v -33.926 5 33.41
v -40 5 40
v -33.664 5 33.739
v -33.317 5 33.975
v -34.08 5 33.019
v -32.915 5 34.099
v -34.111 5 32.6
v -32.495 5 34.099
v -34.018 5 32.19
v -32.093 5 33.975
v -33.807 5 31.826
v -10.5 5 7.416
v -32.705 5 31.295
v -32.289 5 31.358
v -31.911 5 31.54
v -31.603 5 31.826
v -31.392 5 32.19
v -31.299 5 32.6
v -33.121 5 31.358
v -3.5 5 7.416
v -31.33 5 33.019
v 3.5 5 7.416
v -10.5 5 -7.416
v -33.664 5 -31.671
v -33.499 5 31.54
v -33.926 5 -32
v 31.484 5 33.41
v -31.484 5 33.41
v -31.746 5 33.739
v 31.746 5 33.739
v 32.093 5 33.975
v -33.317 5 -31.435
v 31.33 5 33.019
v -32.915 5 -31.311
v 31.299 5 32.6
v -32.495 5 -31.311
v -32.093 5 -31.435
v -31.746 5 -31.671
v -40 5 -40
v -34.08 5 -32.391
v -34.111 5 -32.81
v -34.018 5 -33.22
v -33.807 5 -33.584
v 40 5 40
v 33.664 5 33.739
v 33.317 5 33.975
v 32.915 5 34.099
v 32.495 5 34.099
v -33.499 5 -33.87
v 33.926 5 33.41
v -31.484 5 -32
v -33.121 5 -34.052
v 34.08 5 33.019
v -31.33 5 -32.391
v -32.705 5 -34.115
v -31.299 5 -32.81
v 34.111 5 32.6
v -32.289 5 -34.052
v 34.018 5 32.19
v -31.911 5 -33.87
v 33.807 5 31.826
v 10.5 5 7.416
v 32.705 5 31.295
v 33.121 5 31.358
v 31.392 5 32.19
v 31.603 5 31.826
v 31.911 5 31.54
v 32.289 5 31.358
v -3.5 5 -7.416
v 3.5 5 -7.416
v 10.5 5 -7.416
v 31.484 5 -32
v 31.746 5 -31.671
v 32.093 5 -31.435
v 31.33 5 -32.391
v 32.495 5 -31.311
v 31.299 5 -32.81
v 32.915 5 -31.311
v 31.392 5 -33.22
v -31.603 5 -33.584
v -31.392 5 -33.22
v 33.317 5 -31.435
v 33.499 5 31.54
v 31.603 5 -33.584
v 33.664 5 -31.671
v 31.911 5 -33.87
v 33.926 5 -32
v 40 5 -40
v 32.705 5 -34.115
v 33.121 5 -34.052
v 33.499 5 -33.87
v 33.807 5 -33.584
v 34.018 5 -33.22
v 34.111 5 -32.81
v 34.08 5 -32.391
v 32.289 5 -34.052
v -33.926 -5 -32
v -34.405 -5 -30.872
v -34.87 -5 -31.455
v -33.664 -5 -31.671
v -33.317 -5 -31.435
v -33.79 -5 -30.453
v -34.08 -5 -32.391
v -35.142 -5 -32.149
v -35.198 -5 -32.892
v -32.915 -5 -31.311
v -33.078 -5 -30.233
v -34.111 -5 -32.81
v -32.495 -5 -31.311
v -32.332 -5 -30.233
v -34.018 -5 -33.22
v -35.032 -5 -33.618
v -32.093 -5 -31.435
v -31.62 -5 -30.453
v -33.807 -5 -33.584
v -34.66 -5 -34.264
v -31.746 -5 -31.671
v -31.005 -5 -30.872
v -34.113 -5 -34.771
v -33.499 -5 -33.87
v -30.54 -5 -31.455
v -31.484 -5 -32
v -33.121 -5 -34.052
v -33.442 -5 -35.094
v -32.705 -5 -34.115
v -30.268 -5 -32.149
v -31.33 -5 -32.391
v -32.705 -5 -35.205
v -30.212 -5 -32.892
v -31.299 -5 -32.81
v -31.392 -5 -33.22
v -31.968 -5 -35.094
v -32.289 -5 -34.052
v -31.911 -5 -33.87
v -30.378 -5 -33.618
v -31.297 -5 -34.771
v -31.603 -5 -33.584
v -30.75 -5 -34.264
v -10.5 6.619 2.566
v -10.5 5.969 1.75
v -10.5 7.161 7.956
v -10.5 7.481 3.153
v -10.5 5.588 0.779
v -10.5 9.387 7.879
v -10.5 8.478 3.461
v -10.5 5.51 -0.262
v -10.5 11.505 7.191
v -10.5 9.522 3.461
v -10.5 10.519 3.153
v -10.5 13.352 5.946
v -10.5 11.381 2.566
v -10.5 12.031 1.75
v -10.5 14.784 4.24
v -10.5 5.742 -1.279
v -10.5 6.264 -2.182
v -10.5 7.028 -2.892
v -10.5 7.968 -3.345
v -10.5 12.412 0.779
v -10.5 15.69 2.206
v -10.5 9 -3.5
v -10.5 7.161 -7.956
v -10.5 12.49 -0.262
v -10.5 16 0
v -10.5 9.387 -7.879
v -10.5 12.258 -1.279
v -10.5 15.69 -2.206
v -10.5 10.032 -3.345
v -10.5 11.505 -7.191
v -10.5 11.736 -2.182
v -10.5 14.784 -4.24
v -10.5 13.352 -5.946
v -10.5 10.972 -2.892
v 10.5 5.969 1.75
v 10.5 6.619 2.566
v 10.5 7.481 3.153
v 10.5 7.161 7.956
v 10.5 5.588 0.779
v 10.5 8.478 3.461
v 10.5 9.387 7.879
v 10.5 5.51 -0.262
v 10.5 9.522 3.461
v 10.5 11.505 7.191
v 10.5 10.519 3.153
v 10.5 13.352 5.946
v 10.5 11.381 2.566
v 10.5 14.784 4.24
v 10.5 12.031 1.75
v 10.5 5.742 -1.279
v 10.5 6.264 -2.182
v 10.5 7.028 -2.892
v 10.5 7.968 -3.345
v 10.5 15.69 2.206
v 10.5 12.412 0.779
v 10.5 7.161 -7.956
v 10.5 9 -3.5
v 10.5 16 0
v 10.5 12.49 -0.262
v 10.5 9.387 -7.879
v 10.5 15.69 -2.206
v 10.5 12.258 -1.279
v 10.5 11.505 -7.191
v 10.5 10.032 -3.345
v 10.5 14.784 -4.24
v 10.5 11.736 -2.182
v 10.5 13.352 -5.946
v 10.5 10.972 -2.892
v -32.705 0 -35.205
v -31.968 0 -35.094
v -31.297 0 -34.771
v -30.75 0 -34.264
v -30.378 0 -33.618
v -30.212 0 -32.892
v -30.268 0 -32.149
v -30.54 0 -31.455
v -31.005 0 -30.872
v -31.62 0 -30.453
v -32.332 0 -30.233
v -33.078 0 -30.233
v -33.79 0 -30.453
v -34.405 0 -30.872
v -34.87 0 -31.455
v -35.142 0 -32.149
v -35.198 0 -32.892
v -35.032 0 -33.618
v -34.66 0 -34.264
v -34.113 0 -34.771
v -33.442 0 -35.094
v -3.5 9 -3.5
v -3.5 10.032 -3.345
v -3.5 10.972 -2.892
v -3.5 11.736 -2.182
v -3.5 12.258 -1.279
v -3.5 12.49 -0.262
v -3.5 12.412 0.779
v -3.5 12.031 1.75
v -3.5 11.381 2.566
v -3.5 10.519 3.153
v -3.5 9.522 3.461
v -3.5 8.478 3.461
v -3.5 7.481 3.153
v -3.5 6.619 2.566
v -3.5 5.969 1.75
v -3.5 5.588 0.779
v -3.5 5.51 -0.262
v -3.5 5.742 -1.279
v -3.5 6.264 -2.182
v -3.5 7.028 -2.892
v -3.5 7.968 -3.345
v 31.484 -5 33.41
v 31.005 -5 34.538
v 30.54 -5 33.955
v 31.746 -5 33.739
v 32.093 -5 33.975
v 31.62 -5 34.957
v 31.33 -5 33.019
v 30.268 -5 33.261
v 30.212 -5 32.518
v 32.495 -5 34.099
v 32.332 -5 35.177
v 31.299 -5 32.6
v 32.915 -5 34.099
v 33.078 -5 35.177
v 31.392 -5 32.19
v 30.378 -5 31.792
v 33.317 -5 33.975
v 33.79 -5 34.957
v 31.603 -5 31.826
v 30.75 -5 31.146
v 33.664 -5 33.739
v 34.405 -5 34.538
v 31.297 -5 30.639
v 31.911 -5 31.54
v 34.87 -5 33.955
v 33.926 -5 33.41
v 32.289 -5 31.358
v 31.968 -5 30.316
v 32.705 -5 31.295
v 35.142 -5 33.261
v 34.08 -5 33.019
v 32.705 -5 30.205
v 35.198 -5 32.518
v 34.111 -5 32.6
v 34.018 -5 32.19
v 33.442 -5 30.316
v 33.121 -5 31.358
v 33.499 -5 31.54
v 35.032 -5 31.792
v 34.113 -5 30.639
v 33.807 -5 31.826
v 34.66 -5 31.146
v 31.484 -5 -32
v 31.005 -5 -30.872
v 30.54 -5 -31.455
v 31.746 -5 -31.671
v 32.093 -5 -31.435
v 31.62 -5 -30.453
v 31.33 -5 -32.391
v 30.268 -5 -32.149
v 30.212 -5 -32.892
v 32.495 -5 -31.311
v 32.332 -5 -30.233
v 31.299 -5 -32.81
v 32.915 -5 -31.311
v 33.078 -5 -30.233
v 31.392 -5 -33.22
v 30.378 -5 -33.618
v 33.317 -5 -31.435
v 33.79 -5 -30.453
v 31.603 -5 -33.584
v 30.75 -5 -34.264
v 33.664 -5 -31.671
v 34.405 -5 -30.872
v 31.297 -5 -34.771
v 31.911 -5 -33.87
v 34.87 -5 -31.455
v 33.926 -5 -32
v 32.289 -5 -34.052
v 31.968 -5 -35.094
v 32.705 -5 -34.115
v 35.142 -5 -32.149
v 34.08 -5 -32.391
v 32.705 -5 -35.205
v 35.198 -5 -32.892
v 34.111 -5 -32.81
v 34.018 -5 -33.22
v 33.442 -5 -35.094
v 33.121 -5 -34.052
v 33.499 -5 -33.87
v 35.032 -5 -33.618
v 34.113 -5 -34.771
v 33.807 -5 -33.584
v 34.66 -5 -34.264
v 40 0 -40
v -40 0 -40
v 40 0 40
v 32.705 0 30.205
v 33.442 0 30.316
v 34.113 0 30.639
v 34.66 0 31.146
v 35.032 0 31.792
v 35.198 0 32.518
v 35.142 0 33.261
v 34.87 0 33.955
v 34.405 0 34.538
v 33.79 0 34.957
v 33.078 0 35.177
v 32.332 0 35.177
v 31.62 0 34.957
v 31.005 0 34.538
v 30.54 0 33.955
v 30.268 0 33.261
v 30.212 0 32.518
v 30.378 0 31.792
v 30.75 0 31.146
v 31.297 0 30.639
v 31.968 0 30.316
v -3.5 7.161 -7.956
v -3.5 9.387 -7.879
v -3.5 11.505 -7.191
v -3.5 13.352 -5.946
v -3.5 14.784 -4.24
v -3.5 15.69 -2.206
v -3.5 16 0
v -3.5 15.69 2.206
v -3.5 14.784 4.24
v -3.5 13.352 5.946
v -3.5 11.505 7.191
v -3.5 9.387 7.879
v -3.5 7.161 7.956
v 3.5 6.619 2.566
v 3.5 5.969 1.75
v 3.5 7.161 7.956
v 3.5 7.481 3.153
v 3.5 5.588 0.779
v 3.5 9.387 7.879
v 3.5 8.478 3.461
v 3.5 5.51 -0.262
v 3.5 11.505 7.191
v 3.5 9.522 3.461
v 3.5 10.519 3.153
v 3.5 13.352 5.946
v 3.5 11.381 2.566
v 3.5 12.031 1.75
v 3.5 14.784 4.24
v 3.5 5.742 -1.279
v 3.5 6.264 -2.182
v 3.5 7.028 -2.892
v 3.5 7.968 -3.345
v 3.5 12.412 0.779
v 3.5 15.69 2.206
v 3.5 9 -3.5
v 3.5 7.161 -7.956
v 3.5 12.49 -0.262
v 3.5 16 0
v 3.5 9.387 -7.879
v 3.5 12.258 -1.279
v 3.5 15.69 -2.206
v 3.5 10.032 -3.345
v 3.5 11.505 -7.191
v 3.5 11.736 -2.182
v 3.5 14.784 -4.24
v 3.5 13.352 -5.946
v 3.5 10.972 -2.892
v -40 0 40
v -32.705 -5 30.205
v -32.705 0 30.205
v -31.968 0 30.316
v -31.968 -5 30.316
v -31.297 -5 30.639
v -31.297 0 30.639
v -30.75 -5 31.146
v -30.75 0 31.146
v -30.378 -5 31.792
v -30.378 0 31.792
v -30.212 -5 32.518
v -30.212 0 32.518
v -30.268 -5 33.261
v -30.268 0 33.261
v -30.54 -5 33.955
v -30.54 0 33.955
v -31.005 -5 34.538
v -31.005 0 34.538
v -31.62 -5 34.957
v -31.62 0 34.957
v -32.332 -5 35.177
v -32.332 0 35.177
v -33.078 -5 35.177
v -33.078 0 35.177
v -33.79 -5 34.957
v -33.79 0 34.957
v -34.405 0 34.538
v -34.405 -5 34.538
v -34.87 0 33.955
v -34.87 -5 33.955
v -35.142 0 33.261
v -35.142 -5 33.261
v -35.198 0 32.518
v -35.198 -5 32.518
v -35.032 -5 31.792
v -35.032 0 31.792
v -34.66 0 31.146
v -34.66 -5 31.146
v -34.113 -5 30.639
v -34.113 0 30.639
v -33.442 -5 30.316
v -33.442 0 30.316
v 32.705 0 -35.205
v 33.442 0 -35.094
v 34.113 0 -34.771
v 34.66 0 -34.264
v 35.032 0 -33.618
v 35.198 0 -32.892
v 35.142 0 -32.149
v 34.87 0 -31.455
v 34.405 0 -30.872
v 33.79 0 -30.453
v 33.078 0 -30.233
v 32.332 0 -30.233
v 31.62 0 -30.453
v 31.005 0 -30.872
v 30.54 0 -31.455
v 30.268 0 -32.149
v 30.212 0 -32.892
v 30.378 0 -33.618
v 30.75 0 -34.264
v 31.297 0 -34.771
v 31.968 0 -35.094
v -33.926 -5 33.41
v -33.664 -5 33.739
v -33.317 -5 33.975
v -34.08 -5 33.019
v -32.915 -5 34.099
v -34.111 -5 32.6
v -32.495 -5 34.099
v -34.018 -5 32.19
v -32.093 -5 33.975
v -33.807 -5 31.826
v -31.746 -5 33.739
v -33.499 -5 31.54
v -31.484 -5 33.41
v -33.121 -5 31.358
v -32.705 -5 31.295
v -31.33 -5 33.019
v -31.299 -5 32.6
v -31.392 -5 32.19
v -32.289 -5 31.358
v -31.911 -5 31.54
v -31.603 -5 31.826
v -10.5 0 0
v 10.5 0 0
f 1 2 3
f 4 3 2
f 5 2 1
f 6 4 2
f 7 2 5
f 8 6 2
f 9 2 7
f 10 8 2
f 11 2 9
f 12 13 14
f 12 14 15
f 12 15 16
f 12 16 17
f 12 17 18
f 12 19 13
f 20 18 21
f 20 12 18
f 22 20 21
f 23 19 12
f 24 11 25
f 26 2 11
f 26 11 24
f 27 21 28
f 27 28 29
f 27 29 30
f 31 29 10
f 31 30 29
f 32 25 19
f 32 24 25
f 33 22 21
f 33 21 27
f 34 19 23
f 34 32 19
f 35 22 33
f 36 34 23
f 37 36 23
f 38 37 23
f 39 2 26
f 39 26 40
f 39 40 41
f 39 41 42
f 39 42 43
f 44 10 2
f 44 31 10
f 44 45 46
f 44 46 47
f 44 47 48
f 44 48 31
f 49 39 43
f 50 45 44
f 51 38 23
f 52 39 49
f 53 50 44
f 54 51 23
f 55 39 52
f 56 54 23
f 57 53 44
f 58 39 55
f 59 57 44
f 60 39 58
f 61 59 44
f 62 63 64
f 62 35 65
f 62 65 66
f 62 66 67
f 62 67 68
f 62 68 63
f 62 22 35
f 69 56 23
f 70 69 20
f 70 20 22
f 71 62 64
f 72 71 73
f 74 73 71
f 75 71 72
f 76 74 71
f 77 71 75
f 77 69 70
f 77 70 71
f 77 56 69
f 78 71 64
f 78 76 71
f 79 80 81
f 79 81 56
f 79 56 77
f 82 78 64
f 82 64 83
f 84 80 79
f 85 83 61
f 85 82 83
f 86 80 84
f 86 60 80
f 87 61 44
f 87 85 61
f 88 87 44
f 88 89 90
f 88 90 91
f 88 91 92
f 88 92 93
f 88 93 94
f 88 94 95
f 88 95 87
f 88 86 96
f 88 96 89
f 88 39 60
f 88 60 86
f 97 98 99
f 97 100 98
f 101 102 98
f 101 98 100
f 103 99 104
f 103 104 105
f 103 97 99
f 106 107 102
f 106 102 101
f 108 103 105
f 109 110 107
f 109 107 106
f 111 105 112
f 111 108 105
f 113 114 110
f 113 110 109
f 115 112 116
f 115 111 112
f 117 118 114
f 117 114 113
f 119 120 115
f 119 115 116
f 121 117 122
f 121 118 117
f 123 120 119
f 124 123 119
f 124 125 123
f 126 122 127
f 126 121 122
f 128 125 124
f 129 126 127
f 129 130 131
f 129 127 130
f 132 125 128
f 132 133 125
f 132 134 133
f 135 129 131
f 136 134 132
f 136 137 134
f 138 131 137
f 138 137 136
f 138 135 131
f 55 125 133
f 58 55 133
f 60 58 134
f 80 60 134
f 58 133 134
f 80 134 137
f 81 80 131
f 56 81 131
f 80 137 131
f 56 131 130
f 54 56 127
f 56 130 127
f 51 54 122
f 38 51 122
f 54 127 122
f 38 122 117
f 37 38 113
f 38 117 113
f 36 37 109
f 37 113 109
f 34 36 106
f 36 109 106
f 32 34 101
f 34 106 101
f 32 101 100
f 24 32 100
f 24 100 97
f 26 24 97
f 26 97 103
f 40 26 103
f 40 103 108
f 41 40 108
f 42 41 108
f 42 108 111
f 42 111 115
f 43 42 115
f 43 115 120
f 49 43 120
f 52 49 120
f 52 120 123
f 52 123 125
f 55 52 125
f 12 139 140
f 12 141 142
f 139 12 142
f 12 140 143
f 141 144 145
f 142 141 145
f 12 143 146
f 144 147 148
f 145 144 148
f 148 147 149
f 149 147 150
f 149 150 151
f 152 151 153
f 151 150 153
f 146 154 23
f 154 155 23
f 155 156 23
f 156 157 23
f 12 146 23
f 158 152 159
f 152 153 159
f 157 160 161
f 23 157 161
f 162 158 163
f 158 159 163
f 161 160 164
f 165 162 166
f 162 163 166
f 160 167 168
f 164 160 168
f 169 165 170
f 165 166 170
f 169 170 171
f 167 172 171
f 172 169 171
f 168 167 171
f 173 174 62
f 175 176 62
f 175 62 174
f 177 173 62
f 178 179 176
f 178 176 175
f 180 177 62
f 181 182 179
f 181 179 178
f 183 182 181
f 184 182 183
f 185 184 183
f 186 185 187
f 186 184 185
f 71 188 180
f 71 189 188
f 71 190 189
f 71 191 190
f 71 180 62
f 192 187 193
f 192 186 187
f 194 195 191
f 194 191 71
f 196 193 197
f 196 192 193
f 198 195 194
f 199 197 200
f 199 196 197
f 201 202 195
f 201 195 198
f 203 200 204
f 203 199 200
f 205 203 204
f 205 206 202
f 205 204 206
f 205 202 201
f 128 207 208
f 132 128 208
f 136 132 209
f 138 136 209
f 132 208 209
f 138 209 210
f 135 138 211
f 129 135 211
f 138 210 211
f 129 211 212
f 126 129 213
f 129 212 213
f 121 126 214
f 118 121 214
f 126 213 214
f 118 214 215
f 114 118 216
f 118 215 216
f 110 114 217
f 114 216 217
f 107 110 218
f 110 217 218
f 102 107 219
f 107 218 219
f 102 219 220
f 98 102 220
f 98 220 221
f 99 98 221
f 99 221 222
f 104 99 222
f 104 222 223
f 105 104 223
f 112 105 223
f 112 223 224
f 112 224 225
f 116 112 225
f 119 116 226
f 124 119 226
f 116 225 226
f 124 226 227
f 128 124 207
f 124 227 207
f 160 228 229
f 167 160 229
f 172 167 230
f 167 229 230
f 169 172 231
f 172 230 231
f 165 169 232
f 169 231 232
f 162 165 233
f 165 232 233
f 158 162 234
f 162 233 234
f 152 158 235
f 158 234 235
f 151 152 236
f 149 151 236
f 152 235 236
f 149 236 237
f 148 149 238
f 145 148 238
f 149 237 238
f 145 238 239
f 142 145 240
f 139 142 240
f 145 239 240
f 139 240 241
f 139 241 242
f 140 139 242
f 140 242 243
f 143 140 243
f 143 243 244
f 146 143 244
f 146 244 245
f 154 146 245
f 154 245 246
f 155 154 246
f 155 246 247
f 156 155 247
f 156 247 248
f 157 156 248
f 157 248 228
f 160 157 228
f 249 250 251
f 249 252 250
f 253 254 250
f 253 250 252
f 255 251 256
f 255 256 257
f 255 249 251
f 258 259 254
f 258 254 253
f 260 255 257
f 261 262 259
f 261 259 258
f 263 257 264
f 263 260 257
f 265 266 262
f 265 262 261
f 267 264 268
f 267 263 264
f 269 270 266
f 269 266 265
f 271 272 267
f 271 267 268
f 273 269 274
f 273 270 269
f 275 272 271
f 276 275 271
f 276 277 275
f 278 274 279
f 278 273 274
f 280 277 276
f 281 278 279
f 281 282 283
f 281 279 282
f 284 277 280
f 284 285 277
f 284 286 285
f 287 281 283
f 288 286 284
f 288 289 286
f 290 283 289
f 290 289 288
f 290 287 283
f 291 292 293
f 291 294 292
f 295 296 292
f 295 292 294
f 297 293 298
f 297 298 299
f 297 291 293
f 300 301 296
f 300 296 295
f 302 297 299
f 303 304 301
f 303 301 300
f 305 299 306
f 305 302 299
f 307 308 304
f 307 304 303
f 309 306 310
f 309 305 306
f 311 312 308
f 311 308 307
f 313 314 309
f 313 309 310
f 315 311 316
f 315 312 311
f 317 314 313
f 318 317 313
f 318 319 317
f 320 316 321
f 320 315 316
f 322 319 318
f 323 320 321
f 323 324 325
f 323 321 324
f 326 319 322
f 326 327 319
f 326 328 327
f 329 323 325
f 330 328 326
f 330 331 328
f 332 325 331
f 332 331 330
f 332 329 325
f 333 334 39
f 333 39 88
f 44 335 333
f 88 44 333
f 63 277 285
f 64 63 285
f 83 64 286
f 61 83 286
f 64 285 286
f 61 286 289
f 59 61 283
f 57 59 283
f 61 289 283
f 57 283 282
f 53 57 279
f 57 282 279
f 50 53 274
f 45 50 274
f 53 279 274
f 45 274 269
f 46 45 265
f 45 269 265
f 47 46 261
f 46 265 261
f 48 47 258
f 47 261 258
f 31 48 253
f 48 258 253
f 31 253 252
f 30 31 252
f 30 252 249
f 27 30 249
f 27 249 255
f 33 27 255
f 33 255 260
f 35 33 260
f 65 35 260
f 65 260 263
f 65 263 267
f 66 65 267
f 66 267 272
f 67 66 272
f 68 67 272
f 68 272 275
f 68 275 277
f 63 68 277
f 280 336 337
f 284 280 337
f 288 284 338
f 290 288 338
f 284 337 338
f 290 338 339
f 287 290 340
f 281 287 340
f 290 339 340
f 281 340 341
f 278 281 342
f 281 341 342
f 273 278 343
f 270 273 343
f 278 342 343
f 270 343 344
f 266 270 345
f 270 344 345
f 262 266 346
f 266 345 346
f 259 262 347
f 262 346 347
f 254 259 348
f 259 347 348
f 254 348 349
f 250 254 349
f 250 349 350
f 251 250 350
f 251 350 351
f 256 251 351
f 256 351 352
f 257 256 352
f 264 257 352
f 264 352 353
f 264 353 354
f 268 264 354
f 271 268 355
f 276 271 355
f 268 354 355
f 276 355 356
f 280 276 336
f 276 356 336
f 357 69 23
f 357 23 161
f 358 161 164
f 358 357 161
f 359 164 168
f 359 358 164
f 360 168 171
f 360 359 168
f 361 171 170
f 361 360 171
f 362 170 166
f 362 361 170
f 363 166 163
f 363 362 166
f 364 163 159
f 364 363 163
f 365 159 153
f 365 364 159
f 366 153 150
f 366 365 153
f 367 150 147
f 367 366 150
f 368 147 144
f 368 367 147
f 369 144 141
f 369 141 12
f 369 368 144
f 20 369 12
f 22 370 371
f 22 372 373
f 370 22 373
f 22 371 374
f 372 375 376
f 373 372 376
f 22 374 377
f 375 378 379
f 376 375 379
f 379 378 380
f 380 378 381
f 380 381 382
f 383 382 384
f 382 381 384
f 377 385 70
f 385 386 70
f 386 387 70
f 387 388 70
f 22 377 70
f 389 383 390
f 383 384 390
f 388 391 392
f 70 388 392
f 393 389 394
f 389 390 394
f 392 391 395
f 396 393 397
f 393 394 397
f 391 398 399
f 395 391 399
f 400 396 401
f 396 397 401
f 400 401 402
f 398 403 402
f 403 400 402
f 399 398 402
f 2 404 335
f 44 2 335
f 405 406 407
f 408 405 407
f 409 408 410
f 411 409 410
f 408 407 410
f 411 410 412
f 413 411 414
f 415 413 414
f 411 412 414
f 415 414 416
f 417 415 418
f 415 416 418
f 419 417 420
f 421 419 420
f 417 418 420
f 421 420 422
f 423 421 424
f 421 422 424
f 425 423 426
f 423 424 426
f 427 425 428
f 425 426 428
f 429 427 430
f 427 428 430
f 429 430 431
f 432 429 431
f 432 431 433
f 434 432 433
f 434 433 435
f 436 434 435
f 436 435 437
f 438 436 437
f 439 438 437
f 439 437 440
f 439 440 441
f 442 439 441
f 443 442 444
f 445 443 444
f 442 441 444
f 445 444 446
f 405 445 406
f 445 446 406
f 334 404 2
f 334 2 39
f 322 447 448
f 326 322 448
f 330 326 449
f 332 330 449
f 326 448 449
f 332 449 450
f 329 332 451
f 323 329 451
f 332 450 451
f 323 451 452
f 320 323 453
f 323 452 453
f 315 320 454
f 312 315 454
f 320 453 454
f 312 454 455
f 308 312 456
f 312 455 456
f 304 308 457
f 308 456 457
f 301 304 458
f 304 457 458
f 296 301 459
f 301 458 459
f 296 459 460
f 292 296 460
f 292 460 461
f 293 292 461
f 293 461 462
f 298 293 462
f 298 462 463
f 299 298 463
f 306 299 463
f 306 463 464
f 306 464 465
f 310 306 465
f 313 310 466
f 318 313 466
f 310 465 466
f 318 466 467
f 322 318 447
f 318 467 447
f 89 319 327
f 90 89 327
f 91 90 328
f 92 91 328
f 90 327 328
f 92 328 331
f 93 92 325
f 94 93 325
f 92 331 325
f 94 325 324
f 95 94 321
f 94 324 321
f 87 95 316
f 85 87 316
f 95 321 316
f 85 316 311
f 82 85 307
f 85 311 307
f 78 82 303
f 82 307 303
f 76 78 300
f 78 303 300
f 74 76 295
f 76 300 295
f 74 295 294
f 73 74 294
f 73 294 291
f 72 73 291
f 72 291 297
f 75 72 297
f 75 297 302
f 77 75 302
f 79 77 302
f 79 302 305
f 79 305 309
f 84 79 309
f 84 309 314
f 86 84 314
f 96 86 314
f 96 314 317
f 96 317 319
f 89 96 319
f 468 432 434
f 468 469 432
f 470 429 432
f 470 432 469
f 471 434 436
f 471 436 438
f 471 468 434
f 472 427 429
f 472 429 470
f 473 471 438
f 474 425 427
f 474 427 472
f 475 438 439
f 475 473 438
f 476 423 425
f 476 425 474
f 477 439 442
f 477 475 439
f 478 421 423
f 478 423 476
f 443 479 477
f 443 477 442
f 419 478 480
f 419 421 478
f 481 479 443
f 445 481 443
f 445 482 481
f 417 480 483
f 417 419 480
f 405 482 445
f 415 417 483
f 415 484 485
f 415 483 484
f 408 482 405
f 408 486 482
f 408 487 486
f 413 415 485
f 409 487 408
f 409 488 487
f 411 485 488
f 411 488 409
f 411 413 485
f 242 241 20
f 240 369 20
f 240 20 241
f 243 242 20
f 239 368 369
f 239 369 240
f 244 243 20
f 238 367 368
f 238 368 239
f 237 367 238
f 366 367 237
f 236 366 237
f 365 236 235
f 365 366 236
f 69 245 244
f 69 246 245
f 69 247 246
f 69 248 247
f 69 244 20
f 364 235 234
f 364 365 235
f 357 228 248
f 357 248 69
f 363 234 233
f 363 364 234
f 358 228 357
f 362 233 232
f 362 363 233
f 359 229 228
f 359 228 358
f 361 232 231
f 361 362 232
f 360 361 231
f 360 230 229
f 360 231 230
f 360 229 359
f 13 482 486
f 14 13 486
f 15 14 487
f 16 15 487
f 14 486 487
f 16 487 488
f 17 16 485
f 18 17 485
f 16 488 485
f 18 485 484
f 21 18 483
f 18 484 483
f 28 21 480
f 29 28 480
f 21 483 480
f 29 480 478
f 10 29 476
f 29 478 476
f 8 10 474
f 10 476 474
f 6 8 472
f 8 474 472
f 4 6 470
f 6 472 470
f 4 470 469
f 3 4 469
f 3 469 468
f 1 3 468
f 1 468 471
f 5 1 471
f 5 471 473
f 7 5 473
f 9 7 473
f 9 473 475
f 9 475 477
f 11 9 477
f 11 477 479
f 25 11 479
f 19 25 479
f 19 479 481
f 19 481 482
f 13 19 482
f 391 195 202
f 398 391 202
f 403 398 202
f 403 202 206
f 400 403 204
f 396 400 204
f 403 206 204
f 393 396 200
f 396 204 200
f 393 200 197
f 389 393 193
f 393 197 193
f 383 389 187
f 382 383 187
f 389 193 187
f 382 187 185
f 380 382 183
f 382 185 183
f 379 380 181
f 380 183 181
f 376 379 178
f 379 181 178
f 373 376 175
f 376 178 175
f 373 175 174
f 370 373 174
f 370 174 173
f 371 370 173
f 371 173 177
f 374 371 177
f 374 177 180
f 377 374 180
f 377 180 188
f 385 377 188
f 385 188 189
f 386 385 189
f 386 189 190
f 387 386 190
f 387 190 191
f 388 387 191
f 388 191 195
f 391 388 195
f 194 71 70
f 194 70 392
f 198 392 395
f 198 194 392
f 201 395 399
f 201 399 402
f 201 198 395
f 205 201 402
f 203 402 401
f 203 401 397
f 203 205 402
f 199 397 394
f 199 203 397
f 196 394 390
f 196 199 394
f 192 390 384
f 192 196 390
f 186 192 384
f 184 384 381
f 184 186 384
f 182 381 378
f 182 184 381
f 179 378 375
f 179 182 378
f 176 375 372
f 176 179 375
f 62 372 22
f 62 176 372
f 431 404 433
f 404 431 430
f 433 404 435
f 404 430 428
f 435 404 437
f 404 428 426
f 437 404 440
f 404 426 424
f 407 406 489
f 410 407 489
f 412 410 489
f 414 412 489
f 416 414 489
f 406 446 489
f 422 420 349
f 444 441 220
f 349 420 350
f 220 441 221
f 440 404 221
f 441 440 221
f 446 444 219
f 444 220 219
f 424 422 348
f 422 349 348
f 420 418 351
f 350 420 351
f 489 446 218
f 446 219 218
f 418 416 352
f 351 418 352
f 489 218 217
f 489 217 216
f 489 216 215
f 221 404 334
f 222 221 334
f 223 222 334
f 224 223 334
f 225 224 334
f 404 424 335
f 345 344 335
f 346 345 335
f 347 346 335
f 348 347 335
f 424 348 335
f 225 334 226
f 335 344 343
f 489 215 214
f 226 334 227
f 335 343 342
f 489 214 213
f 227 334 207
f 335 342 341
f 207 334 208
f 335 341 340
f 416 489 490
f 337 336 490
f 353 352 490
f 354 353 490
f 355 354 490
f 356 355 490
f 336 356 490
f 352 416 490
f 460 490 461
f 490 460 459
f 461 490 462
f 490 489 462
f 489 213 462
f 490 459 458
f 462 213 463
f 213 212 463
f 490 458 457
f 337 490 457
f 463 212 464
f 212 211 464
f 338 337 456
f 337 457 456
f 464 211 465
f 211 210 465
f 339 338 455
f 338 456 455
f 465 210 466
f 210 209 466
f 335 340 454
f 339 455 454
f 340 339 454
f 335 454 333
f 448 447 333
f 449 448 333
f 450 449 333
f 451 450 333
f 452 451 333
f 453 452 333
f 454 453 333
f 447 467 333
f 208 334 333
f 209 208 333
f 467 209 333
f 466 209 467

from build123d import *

# Parameters (mm, degrees)
SKETCH2_W           = 80
SKETCH2_H           = 80
BOSS_EXTRUDE1_DEPTH = 5
SKETCH3_R           = 8
BOSS_EXTRUDE2_DEPTH = 10.5
CUT_EXTRUDE3_DEPTH  = 3.5
SKETCH8_R           = 3.5
CUT_EXTRUDE5_DEPTH  = 67.379590237
SKETCH9_R           = 2.5
BOSS_EXTRUDE3_DEPTH = 5
SKETCH10_R          = 1.41
CUT_EXTRUDE6_DEPTH  = 61.340699366


with BuildPart() as part:
    # Sketch2 → Boss-Extrude1 (new body)
    with BuildSketch(Plane(origin=(0, 0, 0), x_dir=(1, 0, 0), z_dir=(0, 1, 0))):
        Rectangle(SKETCH2_W, SKETCH2_H)
    extrude(amount=BOSS_EXTRUDE1_DEPTH)

    # Sketch3 → Boss-Extrude2 (add, symmetric)
    with BuildSketch(Plane(origin=(0, 0, 0), x_dir=(0, 0, -1), z_dir=(1, 0, 0))):
        with Locations((0, 8)):
            Circle(SKETCH3_R)
    extrude(amount=BOSS_EXTRUDE2_DEPTH, both=True)

    # Sketch4 → Cut-Extrude3 (cut, symmetric)
    with BuildSketch(Plane(origin=(0, 0, 0), x_dir=(0, 0, -1), z_dir=(1, 0, 0))):
        Polygon((-114.767025478, 5), (-7.416198487, 5), (7.416198487, 5), (114.767025478, 5), (114.767025478, 219.701653982), (-114.767025478, 219.701653982), align=None)
    extrude(amount=CUT_EXTRUDE3_DEPTH, both=True, mode=Mode.SUBTRACT)

    # Sketch8 → Cut-Extrude5 (cut, through all)
    with BuildSketch(Plane(origin=(10.5, 0, 0), x_dir=(0, 0, -1), z_dir=(1, 0, 0))):
        with Locations((0, 9)):
            Circle(SKETCH8_R)
    extrude(amount=-CUT_EXTRUDE5_DEPTH, mode=Mode.SUBTRACT)

    # Sketch9 → Boss-Extrude3 (add)
    with BuildSketch(Plane.XZ):
        with Locations(Location((-32.705, 32.705, 0), (0, 0, 270))):
            Circle(SKETCH9_R)
        with Locations(Location((32.705, 32.705, 0), (0, 0, 270))):
            Circle(SKETCH9_R)
        with Locations(Location((-32.705, -32.705, 0), (0, 0, 270))):
            Circle(SKETCH9_R)
        with Locations(Location((32.705, -32.705, 0), (0, 0, 270))):
            Circle(SKETCH9_R)
    extrude(amount=BOSS_EXTRUDE3_DEPTH)

    # Sketch10 → Cut-Extrude6 (cut, through all)
    with BuildSketch(Plane.XZ.offset(5)):
        with Locations(Location((-32.705, -32.705, 0), (0, 0, 270))):
            Circle(SKETCH10_R)
        with Locations(Location((-32.705, 32.705, 0), (0, 0, 270))):
            Circle(SKETCH10_R)
        with Locations(Location((32.705, 32.705, 0), (0, 0, 270))):
            Circle(SKETCH10_R)
        with Locations(Location((32.705, -32.705, 0), (0, 0, 270))):
            Circle(SKETCH10_R)
    extrude(amount=-CUT_EXTRUDE6_DEPTH, mode=Mode.SUBTRACT)


solid = part.part
